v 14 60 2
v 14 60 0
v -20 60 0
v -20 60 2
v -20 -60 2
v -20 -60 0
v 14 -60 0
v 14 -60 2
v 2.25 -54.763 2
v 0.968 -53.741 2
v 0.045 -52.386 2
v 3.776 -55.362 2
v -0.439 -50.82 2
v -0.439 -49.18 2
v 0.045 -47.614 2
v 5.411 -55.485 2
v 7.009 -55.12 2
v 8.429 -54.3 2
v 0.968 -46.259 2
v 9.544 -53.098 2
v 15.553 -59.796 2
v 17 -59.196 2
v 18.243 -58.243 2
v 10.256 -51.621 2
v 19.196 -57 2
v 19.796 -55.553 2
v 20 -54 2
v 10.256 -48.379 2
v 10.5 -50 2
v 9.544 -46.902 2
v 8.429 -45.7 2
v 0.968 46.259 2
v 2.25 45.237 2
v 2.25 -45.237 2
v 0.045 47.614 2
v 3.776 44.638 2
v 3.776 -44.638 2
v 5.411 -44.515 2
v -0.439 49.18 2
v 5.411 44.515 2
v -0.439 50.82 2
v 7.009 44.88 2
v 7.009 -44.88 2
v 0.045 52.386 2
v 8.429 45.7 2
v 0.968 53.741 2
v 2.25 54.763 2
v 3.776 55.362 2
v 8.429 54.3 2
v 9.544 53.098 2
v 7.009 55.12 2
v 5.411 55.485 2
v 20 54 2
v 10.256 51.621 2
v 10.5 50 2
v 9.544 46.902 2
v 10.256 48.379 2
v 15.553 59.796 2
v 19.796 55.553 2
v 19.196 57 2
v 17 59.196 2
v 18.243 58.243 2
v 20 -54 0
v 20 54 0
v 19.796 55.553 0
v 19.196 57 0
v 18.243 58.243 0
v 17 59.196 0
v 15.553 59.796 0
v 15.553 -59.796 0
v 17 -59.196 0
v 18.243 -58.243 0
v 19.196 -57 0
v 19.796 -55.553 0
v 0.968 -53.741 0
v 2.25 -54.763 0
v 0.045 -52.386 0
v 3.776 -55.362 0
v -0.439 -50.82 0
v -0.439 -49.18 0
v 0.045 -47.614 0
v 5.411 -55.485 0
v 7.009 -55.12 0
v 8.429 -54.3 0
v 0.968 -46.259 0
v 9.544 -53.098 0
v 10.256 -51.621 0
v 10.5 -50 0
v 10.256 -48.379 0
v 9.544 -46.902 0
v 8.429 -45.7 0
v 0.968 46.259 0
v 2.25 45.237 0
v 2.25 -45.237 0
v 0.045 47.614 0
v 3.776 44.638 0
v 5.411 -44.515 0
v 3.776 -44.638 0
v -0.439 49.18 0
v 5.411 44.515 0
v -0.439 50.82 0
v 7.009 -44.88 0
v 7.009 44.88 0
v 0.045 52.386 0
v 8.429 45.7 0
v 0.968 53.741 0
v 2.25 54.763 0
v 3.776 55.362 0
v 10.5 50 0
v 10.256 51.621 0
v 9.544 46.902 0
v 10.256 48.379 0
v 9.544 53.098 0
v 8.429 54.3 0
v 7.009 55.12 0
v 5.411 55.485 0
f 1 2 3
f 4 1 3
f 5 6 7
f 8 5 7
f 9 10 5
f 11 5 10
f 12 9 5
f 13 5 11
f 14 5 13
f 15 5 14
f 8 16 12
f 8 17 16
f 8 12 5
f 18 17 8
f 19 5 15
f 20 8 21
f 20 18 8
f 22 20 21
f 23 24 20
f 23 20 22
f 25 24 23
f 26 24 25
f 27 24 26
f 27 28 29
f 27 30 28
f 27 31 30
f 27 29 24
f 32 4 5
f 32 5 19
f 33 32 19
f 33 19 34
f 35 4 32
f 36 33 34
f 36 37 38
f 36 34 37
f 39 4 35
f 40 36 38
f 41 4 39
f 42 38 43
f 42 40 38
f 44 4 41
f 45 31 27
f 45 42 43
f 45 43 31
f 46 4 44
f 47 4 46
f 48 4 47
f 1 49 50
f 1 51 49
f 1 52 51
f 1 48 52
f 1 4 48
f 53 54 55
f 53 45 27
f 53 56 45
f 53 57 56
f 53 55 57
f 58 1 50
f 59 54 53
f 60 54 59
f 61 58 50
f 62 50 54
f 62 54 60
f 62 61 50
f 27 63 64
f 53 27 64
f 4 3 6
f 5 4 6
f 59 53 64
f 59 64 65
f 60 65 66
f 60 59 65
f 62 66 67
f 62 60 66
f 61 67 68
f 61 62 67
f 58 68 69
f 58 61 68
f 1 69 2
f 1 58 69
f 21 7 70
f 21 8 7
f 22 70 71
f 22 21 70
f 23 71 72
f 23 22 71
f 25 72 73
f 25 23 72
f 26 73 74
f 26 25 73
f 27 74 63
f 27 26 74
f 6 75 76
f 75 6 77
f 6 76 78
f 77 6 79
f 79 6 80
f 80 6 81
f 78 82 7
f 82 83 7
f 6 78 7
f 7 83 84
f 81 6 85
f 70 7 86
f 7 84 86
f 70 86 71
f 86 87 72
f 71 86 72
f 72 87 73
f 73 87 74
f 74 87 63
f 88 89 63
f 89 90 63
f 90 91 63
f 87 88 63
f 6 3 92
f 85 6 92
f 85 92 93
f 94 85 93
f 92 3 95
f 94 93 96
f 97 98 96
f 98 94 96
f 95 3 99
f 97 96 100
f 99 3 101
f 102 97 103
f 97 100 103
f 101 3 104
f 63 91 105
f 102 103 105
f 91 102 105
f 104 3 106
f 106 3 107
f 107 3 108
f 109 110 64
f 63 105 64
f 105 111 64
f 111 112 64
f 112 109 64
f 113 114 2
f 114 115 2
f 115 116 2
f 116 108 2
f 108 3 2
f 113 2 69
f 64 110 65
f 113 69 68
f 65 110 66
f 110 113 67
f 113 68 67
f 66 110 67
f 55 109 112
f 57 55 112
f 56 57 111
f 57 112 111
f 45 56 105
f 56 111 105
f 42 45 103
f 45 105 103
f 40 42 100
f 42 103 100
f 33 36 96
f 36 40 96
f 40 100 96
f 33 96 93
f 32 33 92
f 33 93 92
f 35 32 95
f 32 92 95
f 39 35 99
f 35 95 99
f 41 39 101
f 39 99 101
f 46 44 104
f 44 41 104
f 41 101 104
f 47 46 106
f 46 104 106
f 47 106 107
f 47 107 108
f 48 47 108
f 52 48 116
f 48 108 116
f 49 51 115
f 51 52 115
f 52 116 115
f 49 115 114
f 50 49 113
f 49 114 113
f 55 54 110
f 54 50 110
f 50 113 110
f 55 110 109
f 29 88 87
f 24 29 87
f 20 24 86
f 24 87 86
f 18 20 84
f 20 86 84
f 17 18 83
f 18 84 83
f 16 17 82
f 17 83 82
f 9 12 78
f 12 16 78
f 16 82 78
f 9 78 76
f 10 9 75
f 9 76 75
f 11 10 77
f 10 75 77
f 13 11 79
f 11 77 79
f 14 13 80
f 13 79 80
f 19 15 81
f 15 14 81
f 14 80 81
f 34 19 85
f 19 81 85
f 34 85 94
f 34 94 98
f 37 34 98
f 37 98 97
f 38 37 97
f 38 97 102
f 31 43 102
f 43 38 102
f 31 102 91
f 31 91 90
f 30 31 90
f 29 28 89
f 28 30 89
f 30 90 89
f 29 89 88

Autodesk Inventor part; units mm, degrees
ref_plane "YZ Plane" through (0, 0, 0) normal (1, 0, 0) x (0, 1, 0)
ref_plane "XZ Plane" through (0, 0, 0) normal (0, 1, 0) x (-1, 0, 0)
ref_plane "XY Plane" through (0, 0, 0) normal (0, 0, 1) x (1, 0, 0)
sketch "Sketch1" plane through (0, 0, 0) normal (0, 0, 1) x (1, 0, 0)
  line L0 (-20, -60) -> (20, -60)
  line L1 (20, -60) -> (20, 60)
  line L2 (20, 60) -> (-20, 60)
  line L3 (-20, 60) -> (-20, -60)
  line L4 (-20, -60) -> (20, 60) construction
  line L5 (20, -60) -> (-20, 60) construction
  circle A0 centre (5, 50) radius 5.5
  circle A1 centre (5, -50) radius 5.5
  line L6 (-20, 0) -> (20, 0) construction
  point P0 (0, 0)
  point P1 (0, 0)
  dimension "d0" = 40
  dimension "d1" = 120
  dimension "d12" = 11
  dimension "d13" = 100
  dimension "d15" = 15
extrude "Plate1" add sketch "Sketch1" along normal blind 2
sketch "Sketch2" plane through (0, 0, 0) normal (0, 0, -1) x (-1, 0, 0)
  line L0 (0, 40) -> (200, 40) construction
  line L1 (200, 40) -> (200, 20) construction
  line L2 (200, 20) -> (0, 20) construction
  line L3 (0, 20) -> (0, 40) construction
  line L4 (-20, 60) -> (20, 60) projected
  line L5 (-20, -60) -> (-20, 60) projected
  point P0 (0, 0)
  point P1 (-48, 100)
  point P2 (20, 60)
  point P3 (-50, 98)
  dimension "d6" = 200
  dimension "d9" = 20
  dimension "d10" = 20
  dimension "d11" = 20
mark "Mark1"
fillet "Corner Round1" radius 6 2 edges at (20, -60, 1) (20, 60, 1)
equation "\"d2\" = Thickness"
equation "\"BendReliefWidth\" = Thickness"
equation "\"BendReliefDepth\" = 0.5 * Thickness"
equation "\"CornerReliefSize\" = 4 * Thickness"
equation "\"MinimumRemnant\" = 2 * Thickness"
equation "\"TransitionRadius\" = BendRadius"
equation "\"JacobiRadiusSize\" = BendRadius"
equation "\"GapSize\" = Thickness"
equation "\"Thickness\" = 2"
equation "\"BendRadius\" = 2.75"
properties part number "TRM 023 face damper" material "AISI 304"
